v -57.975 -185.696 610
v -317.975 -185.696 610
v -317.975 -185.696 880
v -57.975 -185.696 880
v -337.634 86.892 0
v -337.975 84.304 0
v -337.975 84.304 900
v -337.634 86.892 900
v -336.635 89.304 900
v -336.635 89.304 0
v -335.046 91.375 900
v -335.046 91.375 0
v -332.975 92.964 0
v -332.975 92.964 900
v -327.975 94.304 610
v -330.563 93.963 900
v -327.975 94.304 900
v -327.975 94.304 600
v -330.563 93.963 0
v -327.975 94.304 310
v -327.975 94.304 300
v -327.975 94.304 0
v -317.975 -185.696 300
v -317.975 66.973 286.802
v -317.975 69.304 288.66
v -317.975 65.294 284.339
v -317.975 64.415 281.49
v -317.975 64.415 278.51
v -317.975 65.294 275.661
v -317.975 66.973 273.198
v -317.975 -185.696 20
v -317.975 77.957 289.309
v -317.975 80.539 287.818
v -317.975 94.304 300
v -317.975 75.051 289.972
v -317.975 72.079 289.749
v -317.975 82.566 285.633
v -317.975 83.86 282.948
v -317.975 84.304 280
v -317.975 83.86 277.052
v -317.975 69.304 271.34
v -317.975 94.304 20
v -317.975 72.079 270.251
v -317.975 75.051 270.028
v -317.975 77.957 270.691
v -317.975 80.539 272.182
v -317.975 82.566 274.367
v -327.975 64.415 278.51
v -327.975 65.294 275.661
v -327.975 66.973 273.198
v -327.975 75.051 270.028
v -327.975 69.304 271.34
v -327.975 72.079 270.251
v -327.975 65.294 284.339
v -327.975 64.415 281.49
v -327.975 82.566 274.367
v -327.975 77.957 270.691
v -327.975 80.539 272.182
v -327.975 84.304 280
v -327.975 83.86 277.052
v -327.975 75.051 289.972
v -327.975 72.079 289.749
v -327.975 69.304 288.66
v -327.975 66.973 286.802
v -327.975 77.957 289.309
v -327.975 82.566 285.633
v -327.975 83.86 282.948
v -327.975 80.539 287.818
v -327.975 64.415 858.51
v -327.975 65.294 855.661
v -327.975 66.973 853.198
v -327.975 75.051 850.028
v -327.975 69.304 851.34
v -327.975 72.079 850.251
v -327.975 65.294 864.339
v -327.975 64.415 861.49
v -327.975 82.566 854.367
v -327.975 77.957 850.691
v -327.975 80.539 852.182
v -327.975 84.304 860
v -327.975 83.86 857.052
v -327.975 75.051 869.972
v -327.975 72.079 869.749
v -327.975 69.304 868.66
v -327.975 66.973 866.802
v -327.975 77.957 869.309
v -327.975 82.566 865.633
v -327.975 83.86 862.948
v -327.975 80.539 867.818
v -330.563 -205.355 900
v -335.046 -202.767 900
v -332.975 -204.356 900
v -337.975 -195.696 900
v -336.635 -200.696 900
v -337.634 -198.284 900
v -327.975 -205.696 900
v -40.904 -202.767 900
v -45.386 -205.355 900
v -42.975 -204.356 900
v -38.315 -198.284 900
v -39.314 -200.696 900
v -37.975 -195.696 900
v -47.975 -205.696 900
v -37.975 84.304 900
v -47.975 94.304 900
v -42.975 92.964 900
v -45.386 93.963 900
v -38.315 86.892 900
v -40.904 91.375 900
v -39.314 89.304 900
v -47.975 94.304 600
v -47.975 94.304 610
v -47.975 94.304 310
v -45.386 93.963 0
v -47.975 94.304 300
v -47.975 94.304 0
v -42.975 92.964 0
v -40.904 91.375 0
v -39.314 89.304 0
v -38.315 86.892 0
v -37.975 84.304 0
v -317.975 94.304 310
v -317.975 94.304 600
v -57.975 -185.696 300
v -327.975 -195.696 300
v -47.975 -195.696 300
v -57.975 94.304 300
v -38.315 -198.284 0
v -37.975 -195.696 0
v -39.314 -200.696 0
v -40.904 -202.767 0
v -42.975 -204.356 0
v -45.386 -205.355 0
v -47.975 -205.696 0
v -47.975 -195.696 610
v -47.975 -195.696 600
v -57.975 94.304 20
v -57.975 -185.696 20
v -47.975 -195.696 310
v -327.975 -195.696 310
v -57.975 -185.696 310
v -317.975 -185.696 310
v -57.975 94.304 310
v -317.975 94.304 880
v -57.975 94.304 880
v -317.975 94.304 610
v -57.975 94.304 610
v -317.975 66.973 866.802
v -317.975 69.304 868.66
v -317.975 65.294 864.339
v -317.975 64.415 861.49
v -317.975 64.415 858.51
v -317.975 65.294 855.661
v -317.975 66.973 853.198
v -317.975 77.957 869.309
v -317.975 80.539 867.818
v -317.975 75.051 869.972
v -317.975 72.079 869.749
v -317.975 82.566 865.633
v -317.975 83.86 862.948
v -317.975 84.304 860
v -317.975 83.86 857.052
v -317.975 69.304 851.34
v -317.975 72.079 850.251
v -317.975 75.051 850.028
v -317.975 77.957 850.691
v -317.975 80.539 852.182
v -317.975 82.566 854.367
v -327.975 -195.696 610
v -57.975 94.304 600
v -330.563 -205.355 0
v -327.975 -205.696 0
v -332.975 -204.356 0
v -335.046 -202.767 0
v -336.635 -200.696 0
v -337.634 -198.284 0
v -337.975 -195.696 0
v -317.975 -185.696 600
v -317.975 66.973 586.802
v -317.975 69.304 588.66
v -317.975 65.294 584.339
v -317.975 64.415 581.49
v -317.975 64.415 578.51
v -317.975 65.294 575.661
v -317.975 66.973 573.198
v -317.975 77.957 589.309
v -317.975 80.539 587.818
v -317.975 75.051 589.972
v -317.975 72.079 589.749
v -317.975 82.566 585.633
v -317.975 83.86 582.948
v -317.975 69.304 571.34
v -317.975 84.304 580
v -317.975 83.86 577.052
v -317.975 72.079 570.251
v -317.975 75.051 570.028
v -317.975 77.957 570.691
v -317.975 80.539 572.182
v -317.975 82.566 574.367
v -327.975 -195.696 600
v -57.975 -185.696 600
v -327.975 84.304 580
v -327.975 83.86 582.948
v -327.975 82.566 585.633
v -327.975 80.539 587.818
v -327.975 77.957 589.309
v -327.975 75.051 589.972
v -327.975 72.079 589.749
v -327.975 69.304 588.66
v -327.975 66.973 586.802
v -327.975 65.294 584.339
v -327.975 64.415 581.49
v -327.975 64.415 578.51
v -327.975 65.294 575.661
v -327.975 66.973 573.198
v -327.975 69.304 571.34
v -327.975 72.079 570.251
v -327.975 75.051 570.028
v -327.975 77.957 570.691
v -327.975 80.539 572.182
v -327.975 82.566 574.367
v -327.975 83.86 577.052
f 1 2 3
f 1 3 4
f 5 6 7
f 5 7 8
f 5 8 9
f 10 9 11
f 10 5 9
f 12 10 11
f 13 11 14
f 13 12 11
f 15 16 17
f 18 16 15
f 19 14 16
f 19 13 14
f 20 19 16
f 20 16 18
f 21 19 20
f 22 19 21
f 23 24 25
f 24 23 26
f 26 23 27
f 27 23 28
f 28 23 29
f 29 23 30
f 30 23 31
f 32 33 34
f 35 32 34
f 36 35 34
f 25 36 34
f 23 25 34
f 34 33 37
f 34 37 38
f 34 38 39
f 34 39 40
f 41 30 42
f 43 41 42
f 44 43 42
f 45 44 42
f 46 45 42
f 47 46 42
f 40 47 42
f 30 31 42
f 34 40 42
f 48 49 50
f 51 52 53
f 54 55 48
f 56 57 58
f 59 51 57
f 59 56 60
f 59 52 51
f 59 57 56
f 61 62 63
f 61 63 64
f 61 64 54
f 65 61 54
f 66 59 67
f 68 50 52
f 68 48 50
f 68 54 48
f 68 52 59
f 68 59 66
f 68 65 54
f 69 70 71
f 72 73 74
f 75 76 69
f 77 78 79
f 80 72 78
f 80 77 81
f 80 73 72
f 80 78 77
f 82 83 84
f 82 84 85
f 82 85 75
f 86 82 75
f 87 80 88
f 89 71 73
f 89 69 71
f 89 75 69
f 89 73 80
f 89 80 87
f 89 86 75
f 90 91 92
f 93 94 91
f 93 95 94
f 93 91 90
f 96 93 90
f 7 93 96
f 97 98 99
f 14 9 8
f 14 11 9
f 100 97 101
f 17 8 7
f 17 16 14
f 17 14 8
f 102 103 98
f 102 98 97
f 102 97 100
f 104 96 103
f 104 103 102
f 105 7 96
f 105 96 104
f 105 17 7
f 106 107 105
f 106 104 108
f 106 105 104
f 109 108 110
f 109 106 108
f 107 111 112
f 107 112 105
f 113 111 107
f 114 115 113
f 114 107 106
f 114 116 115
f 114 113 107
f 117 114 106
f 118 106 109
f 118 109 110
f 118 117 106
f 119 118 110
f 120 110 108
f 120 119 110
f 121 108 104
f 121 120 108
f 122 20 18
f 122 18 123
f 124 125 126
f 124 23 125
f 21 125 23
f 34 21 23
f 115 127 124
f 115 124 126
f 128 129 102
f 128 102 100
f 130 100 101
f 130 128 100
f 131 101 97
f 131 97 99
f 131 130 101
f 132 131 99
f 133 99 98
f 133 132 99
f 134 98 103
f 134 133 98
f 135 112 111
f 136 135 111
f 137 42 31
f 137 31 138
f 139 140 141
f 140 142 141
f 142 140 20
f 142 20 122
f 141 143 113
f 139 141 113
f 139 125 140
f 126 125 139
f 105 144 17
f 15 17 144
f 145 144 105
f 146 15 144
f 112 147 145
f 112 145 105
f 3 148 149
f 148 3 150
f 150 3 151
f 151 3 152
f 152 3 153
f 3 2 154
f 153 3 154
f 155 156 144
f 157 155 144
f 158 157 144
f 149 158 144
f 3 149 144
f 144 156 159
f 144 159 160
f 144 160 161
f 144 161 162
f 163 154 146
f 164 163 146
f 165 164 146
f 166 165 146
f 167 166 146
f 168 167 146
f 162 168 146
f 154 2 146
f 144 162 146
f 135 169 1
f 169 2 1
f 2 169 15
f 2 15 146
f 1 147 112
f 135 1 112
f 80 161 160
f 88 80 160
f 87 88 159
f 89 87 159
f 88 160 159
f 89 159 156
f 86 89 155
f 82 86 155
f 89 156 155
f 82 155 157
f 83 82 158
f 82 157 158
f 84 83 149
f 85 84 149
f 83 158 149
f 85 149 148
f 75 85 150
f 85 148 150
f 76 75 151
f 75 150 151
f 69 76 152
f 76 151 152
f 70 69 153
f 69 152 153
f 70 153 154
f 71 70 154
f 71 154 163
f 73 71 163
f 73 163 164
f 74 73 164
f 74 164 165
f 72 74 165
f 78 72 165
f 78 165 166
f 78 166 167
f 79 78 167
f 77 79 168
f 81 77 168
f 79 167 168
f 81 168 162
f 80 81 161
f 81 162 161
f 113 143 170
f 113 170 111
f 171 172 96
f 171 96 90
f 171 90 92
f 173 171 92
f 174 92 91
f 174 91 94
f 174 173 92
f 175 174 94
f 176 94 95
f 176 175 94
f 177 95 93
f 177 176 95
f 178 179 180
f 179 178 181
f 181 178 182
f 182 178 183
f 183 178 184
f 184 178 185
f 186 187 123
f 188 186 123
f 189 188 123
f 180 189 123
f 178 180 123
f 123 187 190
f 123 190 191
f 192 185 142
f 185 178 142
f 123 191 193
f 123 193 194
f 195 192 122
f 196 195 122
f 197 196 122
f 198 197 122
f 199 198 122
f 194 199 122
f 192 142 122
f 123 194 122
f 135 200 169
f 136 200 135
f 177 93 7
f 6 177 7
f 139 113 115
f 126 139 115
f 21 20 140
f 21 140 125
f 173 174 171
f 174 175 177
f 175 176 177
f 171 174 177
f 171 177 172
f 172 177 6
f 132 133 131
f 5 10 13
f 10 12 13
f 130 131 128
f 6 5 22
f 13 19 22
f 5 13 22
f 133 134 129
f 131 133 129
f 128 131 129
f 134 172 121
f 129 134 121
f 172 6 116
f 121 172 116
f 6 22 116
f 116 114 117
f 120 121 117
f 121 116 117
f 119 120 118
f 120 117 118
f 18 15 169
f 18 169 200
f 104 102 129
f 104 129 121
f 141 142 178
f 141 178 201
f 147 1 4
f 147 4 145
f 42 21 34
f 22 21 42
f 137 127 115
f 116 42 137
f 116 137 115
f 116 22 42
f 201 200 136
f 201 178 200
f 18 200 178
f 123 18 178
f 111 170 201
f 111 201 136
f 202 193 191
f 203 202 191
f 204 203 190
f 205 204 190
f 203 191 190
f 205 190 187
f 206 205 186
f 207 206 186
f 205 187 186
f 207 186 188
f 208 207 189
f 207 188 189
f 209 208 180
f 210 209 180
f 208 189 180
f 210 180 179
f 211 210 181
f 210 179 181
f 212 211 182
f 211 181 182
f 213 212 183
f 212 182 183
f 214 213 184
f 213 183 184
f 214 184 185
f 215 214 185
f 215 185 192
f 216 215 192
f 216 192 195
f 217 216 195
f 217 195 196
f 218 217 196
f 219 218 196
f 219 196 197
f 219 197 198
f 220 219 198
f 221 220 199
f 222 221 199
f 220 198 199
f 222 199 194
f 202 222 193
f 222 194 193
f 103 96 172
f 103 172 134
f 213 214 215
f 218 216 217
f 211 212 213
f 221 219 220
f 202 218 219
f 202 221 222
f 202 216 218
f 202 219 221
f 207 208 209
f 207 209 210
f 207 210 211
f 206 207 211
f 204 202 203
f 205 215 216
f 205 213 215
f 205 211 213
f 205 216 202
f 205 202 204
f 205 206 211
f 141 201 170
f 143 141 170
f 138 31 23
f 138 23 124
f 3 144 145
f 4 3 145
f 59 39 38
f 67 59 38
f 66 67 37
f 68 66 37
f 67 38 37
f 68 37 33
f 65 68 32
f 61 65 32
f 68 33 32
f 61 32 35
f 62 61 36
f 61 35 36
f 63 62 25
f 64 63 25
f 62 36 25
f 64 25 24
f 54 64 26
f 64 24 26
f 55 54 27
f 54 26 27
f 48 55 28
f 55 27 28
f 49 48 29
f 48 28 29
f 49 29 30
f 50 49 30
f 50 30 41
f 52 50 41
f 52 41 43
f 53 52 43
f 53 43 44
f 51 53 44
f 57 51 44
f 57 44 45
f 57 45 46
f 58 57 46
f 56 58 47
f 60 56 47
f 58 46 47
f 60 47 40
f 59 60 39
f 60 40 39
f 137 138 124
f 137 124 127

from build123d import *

# Parameters (mm, degrees)
SKETCH1_W           = 300
SKETCH1_H           = 300
BOSS_EXTRUDE1_DEPTH = 900
SHELL1_T            = -20
SKETCH2_W           = 280
SKETCH2_H           = 10
CUT_EXTRUDE1_DEPTH  = 290
SKETCH3_R           = 10
CUT_EXTRUDE2_DEPTH  = 10
FILLET1_START       = -1
FILLET1_DEPTH       = 902


with BuildPart() as part:
    # Sketch1 → Boss-Extrude1 (new body)
    with BuildSketch(Plane.XY):
        with Locations((-187.974683544, -55.696202532)):
            Rectangle(SKETCH1_W, SKETCH1_H)
    extrude(amount=BOSS_EXTRUDE1_DEPTH)

    # Shell1
    shell1_openings = [part.faces().sort_by_distance(p)[0] for p in [
        (-187.974683544, 94.303797468, 450),
    ]]
    offset(amount=SHELL1_T, openings=shell1_openings, kind=Kind.INTERSECTION)

    # Sketch2 → Cut-Extrude1 (cut)
    with BuildSketch(Plane(origin=(0, 94.303797468, 0), x_dir=(1, 0, 0), z_dir=(0, 1, 0))):
        with Locations((-187.974683544, -305)):
            Rectangle(SKETCH2_W, SKETCH2_H)
        with Locations((-187.974683544, -605)):
            Rectangle(SKETCH2_W, SKETCH2_H)
    extrude(amount=-CUT_EXTRUDE1_DEPTH, mode=Mode.SUBTRACT)

    # Sketch3 → Cut-Extrude2 (cut)
    with BuildSketch(Plane(origin=(-317.974683544, 0, 0), x_dir=(0, 0, -1), z_dir=(1, 0, 0))):
        with Locations(Location((-580, 74.303797468, 0), (0, 0, 90))):
            Circle(SKETCH3_R)
        with Locations(Location((-280, 74.303797468, 0), (0, 0, 90))):
            Circle(SKETCH3_R)
        with Locations(Location((-860, 74.303797468, 0), (0, 0, 90))):
            Circle(SKETCH3_R)
    extrude(amount=-CUT_EXTRUDE2_DEPTH, mode=Mode.SUBTRACT)

    # Fillet1: read off the stored shape, not the designer's step
    # Fillet1 outline → Fillet1 (cut)
    with BuildSketch(Plane.XY.offset(FILLET1_START)):
        with BuildLine():
            Line((-37.974683544, 94.303797468), (-47.974683544, 94.303797468))
            ThreePointArc((-47.974683544, 94.303797468), (-40.903615732, 91.37486528), (-37.974683544, 84.303797468))
            Line((-37.974683544, 84.303797468), (-37.974683544, 94.303797468))
        make_face()
        with BuildLine():
            Line((-37.974683544, -205.696202532), (-37.974683544, -195.696202532))
            ThreePointArc((-37.974683544, -195.696202532), (-40.903615732, -202.767270344), (-47.974683544, -205.696202532))
            Line((-47.974683544, -205.696202532), (-37.974683544, -205.696202532))
        make_face()
        with BuildLine():
            ThreePointArc((-337.974683544, 84.303797468), (-335.045751356, 91.37486528), (-327.974683544, 94.303797468))
            Line((-327.974683544, 94.303797468), (-337.974683544, 94.303797468))
            Line((-337.974683544, 94.303797468), (-337.974683544, 84.303797468))
        make_face()
        with BuildLine():
            Line((-337.974683544, -205.696202532), (-327.974683544, -205.696202532))
            ThreePointArc((-327.974683544, -205.696202532), (-335.045751356, -202.767270344), (-337.974683544, -195.696202532))
            Line((-337.974683544, -195.696202532), (-337.974683544, -205.696202532))
        make_face()
    extrude(amount=FILLET1_DEPTH, mode=Mode.SUBTRACT)


solid = part.part
